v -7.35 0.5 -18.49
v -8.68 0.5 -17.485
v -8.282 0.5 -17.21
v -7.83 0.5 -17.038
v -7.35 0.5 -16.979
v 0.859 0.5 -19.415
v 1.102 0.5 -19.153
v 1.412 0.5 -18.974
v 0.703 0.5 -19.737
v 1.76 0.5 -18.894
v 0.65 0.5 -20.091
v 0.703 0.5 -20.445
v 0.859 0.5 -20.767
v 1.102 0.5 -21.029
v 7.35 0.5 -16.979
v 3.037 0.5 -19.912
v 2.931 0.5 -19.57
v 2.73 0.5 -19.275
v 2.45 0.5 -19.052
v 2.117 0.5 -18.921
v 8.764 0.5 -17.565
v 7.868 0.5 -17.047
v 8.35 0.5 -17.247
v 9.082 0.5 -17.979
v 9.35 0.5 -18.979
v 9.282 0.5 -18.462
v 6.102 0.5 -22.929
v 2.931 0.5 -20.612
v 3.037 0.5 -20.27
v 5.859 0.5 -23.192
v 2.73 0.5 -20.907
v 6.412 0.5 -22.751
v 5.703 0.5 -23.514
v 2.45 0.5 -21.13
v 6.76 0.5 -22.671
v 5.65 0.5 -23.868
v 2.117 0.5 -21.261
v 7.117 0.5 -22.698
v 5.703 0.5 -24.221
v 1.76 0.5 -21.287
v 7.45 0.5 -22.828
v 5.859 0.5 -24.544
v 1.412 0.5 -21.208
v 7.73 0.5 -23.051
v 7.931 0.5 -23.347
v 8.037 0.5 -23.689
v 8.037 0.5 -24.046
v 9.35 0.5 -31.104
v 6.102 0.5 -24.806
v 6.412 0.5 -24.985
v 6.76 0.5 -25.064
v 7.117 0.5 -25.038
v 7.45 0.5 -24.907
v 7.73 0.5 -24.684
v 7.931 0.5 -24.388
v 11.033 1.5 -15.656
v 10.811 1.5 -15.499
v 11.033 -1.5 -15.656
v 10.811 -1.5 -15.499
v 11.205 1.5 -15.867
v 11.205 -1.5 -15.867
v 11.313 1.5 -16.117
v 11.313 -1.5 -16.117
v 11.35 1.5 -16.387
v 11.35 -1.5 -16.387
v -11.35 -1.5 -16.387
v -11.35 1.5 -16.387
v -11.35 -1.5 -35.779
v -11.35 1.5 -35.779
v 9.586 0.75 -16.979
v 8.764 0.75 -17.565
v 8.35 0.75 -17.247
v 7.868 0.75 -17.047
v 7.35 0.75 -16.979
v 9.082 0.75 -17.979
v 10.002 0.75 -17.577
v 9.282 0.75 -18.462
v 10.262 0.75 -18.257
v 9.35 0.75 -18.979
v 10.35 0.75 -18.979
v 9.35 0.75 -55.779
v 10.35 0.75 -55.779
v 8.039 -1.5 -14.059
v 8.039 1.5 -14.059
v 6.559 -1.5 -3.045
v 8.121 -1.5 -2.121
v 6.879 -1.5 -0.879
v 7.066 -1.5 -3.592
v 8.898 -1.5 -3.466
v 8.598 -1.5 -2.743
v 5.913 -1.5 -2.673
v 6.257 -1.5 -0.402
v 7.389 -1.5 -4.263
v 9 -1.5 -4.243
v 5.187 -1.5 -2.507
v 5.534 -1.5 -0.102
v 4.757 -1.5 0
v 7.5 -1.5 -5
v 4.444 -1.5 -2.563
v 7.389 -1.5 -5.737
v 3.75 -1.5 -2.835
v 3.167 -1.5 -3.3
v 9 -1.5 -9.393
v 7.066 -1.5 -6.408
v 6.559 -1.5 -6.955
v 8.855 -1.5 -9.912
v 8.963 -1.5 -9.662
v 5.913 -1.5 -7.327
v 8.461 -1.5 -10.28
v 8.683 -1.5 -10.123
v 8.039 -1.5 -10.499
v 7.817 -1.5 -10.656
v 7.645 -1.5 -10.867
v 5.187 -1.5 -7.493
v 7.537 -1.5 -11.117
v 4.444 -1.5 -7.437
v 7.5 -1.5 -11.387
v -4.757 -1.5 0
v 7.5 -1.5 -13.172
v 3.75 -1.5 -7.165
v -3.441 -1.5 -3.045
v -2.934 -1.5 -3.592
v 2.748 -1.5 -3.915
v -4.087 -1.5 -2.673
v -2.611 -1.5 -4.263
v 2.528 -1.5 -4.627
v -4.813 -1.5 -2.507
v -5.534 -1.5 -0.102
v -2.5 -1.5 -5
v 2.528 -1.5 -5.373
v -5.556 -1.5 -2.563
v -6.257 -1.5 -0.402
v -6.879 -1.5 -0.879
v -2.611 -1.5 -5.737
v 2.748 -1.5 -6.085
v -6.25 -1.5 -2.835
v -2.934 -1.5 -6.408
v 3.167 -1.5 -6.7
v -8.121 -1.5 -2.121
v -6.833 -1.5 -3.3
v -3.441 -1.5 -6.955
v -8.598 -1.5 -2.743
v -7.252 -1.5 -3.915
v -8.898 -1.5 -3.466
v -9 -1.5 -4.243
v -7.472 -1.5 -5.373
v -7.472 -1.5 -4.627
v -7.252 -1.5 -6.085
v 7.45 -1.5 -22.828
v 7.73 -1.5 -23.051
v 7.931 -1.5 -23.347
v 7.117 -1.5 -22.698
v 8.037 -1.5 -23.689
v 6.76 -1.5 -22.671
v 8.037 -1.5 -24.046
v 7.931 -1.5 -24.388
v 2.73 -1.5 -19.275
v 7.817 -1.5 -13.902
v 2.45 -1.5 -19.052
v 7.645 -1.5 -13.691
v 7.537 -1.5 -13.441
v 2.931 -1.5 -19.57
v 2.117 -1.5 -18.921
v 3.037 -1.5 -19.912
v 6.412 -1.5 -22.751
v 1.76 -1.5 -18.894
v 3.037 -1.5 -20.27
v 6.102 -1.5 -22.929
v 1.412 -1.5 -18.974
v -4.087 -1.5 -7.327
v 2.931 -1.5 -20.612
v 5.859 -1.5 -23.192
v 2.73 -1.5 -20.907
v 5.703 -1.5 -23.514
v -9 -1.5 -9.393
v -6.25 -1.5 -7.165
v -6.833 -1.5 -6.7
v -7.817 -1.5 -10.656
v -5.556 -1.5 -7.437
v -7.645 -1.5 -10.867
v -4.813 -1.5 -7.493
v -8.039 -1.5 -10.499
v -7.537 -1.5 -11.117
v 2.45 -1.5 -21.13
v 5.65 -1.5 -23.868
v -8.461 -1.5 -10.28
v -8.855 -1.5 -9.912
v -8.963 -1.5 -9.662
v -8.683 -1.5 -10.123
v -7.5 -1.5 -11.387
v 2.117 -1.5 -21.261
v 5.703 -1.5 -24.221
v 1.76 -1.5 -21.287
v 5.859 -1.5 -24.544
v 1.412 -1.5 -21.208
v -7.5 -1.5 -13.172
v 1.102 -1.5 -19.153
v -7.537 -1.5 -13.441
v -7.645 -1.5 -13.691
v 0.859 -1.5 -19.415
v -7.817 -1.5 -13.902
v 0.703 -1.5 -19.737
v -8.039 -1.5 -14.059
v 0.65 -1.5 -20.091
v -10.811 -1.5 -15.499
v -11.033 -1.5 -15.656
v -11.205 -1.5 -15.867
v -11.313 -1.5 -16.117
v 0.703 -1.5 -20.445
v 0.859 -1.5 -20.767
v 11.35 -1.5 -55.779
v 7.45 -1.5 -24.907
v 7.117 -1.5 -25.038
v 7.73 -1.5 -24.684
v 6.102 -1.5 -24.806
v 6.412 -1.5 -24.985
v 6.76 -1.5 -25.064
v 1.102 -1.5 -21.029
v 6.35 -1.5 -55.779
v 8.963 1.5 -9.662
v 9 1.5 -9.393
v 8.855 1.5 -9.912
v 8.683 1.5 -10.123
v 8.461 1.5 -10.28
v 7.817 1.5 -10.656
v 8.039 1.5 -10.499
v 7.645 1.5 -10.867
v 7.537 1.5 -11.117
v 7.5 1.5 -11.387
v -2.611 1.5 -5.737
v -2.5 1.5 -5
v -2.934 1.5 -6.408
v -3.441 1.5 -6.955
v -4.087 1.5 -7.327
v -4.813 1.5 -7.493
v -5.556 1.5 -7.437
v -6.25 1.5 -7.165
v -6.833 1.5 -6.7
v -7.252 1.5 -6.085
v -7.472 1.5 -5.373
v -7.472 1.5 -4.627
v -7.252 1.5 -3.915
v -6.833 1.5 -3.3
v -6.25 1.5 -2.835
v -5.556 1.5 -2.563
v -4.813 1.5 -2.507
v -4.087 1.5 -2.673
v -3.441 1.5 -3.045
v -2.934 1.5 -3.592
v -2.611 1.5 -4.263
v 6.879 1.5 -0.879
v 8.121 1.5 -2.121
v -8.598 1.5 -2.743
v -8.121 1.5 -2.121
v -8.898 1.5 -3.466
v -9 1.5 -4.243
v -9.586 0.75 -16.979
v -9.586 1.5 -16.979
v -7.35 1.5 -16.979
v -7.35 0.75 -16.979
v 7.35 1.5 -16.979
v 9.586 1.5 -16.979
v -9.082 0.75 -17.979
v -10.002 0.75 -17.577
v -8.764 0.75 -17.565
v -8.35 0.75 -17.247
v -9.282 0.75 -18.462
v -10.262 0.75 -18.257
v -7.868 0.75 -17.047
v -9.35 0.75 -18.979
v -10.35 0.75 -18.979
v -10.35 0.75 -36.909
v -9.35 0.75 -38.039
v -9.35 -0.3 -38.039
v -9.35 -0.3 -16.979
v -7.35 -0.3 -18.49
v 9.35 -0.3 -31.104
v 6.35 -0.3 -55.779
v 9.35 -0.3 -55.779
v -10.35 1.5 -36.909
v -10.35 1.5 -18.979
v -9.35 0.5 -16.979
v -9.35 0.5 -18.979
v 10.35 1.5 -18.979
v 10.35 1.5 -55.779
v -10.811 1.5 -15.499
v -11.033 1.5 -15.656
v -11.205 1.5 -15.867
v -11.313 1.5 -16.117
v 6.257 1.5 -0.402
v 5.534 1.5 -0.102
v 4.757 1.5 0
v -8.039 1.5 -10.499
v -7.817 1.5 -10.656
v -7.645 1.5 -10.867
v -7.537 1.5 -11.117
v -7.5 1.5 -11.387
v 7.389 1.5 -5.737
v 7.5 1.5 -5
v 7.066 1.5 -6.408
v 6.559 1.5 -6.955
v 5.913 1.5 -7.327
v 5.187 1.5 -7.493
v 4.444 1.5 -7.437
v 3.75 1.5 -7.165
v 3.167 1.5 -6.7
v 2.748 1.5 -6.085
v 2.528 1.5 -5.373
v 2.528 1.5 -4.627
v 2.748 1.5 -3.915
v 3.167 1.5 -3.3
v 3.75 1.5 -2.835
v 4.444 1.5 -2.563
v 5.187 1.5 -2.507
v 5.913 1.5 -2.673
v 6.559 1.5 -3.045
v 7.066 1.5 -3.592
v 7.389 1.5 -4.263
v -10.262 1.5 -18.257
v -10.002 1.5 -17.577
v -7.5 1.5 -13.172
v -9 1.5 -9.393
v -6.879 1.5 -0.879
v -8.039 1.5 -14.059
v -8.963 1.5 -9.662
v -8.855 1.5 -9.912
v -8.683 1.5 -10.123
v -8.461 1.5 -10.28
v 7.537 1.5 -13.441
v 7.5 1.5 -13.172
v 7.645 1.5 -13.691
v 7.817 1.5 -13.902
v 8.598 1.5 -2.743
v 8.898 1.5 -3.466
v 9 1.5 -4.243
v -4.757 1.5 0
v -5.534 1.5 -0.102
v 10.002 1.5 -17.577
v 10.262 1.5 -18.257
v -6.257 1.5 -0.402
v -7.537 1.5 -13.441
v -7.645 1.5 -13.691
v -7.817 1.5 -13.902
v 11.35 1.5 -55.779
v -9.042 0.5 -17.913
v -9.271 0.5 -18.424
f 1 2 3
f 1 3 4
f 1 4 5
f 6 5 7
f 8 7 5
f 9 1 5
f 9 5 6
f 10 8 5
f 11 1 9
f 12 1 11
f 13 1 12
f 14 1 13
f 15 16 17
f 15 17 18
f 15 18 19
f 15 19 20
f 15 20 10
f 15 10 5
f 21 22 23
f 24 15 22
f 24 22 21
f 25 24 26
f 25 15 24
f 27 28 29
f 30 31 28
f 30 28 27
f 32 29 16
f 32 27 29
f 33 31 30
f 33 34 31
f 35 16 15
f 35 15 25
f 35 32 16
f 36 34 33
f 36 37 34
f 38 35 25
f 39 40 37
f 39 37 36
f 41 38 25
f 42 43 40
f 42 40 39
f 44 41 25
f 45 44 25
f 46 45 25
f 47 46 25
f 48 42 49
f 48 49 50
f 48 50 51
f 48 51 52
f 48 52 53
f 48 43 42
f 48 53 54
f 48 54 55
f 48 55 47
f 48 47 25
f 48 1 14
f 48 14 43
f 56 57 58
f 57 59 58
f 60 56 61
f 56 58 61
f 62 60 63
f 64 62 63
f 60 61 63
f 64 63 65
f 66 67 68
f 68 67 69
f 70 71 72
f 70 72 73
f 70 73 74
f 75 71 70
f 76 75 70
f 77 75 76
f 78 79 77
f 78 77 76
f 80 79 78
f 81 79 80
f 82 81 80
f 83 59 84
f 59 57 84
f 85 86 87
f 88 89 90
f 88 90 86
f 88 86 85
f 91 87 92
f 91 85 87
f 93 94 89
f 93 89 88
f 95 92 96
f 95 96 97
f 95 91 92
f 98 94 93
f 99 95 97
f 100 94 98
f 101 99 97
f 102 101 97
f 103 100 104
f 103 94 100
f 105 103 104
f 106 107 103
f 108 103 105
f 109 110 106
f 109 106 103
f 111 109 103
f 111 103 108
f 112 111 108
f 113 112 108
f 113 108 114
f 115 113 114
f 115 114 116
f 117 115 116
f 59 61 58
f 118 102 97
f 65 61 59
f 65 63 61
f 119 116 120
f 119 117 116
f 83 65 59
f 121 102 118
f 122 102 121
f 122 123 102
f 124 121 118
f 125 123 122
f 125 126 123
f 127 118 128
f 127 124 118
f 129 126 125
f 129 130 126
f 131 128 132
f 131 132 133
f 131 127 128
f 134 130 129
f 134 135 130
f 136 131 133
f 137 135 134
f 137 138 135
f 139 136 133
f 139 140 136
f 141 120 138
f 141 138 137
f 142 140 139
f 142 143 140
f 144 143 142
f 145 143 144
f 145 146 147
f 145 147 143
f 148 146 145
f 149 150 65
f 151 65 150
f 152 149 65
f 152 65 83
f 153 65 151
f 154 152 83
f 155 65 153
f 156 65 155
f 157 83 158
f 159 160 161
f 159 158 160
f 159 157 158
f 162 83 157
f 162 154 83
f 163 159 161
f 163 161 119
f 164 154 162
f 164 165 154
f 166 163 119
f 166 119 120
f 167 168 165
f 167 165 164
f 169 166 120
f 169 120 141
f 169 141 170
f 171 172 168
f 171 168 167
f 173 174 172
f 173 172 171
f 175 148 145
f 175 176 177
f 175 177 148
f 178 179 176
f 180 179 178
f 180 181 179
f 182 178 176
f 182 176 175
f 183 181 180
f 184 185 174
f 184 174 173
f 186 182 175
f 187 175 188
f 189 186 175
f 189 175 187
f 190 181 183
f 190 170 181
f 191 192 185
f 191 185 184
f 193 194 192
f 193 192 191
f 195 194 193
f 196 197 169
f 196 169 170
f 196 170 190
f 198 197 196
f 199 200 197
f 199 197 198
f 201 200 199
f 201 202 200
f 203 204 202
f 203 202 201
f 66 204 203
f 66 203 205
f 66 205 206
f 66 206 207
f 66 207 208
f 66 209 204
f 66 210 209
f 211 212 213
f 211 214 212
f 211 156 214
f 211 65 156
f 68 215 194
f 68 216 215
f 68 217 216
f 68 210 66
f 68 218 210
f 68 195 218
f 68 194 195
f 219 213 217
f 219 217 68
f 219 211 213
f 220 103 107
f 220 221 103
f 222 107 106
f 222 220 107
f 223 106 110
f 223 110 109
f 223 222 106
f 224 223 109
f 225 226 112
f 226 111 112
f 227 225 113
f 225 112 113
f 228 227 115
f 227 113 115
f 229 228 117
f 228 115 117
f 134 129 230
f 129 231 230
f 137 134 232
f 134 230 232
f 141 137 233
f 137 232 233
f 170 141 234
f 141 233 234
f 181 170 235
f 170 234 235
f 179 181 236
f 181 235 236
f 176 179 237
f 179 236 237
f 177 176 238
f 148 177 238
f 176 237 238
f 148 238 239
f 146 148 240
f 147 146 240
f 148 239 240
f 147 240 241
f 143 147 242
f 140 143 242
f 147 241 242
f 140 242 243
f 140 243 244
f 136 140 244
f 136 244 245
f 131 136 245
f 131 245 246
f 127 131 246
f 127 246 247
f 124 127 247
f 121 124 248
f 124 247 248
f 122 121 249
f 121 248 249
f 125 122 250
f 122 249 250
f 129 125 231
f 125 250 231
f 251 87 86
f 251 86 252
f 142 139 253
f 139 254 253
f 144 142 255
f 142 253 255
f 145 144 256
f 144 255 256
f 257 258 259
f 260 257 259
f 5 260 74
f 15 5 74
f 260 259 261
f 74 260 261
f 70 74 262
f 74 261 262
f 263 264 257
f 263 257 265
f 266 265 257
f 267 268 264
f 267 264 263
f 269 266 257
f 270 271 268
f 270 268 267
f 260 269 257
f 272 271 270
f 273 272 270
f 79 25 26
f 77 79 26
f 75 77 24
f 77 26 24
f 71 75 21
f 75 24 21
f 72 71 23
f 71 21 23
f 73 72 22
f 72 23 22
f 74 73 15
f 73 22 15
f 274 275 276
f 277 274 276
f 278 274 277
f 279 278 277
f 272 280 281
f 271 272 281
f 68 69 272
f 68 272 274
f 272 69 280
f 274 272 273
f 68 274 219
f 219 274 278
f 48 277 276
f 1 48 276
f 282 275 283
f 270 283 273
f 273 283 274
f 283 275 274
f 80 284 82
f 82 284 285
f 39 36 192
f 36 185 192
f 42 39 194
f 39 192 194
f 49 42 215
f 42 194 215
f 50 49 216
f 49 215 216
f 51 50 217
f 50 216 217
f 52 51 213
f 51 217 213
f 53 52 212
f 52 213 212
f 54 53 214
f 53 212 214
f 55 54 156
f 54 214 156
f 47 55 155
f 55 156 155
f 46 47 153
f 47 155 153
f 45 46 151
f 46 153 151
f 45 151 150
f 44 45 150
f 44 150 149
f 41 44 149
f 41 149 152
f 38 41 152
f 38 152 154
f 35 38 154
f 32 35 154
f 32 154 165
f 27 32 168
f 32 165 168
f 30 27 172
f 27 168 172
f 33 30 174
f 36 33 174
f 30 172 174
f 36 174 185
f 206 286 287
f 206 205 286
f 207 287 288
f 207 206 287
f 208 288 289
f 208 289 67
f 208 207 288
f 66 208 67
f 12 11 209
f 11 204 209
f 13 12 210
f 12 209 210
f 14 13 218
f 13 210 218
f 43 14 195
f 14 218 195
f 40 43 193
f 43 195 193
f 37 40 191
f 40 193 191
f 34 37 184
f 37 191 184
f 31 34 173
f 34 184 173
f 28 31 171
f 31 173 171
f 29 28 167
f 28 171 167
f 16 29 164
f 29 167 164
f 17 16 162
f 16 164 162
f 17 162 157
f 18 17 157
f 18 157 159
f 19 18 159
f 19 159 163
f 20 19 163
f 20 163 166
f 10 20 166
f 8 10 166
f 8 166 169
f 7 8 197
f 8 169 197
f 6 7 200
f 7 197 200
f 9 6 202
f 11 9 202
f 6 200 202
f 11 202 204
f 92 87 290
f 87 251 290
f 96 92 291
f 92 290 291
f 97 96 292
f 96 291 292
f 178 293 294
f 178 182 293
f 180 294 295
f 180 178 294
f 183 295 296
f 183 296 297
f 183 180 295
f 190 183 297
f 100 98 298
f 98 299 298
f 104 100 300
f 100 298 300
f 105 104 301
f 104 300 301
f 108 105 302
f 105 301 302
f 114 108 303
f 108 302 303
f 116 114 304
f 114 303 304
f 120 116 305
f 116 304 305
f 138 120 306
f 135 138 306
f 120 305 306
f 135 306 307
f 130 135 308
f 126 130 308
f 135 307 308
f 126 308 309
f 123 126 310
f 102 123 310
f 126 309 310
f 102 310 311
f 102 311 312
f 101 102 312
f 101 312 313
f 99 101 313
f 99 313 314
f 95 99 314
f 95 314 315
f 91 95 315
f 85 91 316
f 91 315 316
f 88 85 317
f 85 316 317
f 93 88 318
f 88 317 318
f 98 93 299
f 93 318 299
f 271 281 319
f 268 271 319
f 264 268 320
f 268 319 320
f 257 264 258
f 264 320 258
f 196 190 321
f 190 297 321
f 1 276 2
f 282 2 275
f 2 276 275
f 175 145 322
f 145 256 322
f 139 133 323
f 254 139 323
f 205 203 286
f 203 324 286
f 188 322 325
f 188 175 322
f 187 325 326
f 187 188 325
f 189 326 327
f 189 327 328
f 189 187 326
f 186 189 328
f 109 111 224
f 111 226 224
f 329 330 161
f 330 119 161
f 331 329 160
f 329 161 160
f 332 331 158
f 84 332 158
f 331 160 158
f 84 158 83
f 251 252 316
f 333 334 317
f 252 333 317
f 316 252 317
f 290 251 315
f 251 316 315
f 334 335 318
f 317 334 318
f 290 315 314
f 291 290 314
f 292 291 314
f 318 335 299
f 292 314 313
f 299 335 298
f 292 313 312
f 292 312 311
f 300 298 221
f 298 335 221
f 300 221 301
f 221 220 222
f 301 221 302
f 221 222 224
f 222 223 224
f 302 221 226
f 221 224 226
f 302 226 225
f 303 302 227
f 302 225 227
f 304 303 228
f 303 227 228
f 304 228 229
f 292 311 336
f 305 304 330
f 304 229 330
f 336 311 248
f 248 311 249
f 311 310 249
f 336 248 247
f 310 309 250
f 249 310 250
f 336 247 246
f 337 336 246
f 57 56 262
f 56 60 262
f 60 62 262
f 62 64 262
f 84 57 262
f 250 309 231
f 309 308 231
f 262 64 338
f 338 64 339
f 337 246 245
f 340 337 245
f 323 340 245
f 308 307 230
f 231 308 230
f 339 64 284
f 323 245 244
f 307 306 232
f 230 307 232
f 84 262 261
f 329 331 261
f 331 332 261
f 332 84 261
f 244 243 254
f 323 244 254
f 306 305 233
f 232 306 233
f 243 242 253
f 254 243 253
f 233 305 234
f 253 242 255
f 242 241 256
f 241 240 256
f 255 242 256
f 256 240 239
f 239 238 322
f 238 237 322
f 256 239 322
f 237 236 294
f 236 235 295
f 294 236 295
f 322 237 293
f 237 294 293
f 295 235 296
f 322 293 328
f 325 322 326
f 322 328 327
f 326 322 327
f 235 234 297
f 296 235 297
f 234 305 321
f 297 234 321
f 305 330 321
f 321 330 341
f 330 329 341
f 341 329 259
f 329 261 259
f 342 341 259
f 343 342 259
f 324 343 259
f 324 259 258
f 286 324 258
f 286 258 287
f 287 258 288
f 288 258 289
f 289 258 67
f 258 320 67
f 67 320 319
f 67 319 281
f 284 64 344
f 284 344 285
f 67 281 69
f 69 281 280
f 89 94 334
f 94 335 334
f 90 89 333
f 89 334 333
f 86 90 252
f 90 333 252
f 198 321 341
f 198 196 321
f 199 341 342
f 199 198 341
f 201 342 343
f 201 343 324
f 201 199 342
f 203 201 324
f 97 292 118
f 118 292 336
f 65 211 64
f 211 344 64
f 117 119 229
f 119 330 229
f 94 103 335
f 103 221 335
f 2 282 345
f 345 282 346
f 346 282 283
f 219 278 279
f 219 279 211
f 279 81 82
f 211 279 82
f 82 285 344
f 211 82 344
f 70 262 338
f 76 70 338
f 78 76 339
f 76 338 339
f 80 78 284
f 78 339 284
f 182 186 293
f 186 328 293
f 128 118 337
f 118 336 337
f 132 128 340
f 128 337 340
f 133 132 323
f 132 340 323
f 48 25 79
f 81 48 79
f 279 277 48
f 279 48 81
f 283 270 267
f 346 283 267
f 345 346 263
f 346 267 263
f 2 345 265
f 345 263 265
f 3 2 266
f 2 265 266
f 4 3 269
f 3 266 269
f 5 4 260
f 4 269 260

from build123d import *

# Parameters (mm, degrees)
BOSS_EXTRUDE1_DEPTH                             = 1.5
SKETCH2_R                                       = 2.5
CUT_EXTRUDE1_DEPTH                              = 2.5
CUT_EXTRUDE1_DEPTH_BACK                         = 2.5
SKETCH4_W                                       = 18.7
SKETCH4_H                                       = 38.8
CUT_EXTRUDE4_DEPTH                              = 2.5
SKETCH4_2_W                                     = 18.7
SKETCH4_2_H                                     = 38.8
CUT_EXTRUDE5_DEPTH                              = 0.3
FILLET6_R                                       = 2
SKETCH4_4_W                                     = 18.7
SKETCH4_4_H                                     = 38.8
CUT_EXTRUDE6_DEPTH                              = 0.5
CUT_EXTRUDE6_DEPTH_BACK                         = 0.3
BOSS_EXTRUDE2_DEPTH                             = 0.8
FILLET7_R                                       = 2
CHAMFER1_SIZE                                   = 3
FILLET2_R                                       = 1
FILLET3_R                                       = 3
CUT_EXTRUDE7_DEPTH                              = 0.75
CSK_FOR_M2_FLAT_HEAD_MACHINE_SCREW1_D           = 2.4
CSK_FOR_M2_FLAT_HEAD_MACHINE_SCREW1_DEPTH       = 4
CSK_FOR_M2_FLAT_HEAD_MACHINE_SCREW1_CSINK_D     = 4.4
CSK_FOR_M2_FLAT_HEAD_MACHINE_SCREW1_CSINK_ANGLE = 90
CSK_FOR_M2_FLAT_HEAD_MACHINE_SCREW1_TIP         = 0.721032743


with BuildPart() as part:
    # Sketch1 → Boss-Extrude1 (new body, symmetric)
    with BuildSketch(Plane(origin=(0, 0, 0), x_dir=(1, 0, 0), z_dir=(0, 1, 0))):
        Polygon((-9, 0), (-9, 10), (-7.5, 10.779220779), (-7.5, 13.779220779), (-11.35, 15.779220779), (-11.35, 35.779220779), (6.35, 55.779220779), (11.35, 55.779220779), (11.35, 15.779220779), (7.5, 13.779220779), (7.5, 10.779220779), (9, 10), (9, 0), align=None)
    extrude(amount=BOSS_EXTRUDE1_DEPTH, both=True)

    # Sketch2 → Cut-Extrude1 (cut, two sides)
    with BuildSketch(Plane(origin=(0, 0, 0), x_dir=(1, 0, 0), z_dir=(0, 1, 0))) as cut_extrude1_sk:
        with Locations((-5, 5)):
            Circle(SKETCH2_R)
        with Locations((5, 5)):
            Circle(SKETCH2_R)
    extrude(amount=CUT_EXTRUDE1_DEPTH, mode=Mode.SUBTRACT)
    extrude(cut_extrude1_sk.sketch, amount=-CUT_EXTRUDE1_DEPTH_BACK, mode=Mode.SUBTRACT)

    # Sketch4 → Cut-Extrude4 (cut, through all)
    with BuildSketch(Plane(origin=(0, 0, 0), x_dir=(1, 0, 0), z_dir=(0, 1, 0))):
        with Locations((0, 36.379220779)):
            Rectangle(SKETCH4_W, SKETCH4_H)
    extrude(amount=CUT_EXTRUDE4_DEPTH, mode=Mode.SUBTRACT)

    # Sketch4<2> → Cut-Extrude5 (cut, symmetric)
    with BuildSketch(Plane(origin=(0, 0, 0), x_dir=(1, 0, 0), z_dir=(0, 1, 0))):
        with Locations((0, 36.379220779)):
            Rectangle(SKETCH4_2_W, SKETCH4_2_H)
    extrude(amount=CUT_EXTRUDE5_DEPTH, both=True, mode=Mode.SUBTRACT)

    # Fillet6
    fillet6_edges = [part.edges().sort_by_distance(p)[0] for p in [
        (-9.35, 0.6, -16.979220779),
    ]]
    fillet(fillet6_edges, radius=FILLET6_R)

    # Sketch4<4> → Cut-Extrude6 (cut, two sides)
    with BuildSketch(Plane(origin=(0, 0, 0), x_dir=(1, 0, 0), z_dir=(0, 1, 0))) as cut_extrude6_sk:
        with Locations((0, 36.379220779)):
            Rectangle(SKETCH4_4_W, SKETCH4_4_H)
    extrude(amount=CUT_EXTRUDE6_DEPTH, mode=Mode.SUBTRACT)
    extrude(cut_extrude6_sk.sketch, amount=-CUT_EXTRUDE6_DEPTH_BACK, mode=Mode.SUBTRACT)

    # Sketch9 → Boss-Extrude2 (add)
    with BuildSketch(Plane(origin=(0, -0.3, 0), x_dir=(1, 0, 0), z_dir=(0, 1, 0))):
        Polygon((9.35, 16.979220779), (9.35, 31.104220779), (-7.35, 18.489915966), (-9.35, 16.979220779), align=None)
    extrude(amount=BOSS_EXTRUDE2_DEPTH)

    # Fillet7
    fillet7_edges = [part.edges().sort_by_distance(p)[0] for p in [
        (9.35, 1, -16.979220779),
    ]]
    fillet(fillet7_edges, radius=FILLET7_R)

    # Chamfer1
    chamfer1_edges = [part.edges().sort_by_distance(p)[0] for p in [
        (-9, 0, 0),
        (9, 0, 0),
    ]]
    chamfer(chamfer1_edges, length=CHAMFER1_SIZE)

    # Fillet2
    fillet2_edges = [part.edges().sort_by_distance(p)[0] for p in [
        (-9, 0, -10),
        (-7.5, 0, -10.779220779),
        (-7.5, 0, -13.779220779),
        (-11.35, 0, -15.779220779),
        (11.35, 0, -15.779220779),
        (7.5, 0, -13.779220779),
        (7.5, 0, -10.779220779),
        (9, 0, -10),
    ]]
    fillet(fillet2_edges, radius=FILLET2_R)

    # Fillet3
    fillet3_edges = [part.edges().sort_by_distance(p)[0] for p in [
        (9, 0, -3),
        (-6, 0, 0),
        (6, 0, 0),
        (-9, 0, -3),
    ]]
    fillet(fillet3_edges, radius=FILLET3_R)

    # Sketch10 → Cut-Extrude7 (cut)
    with BuildSketch(Plane(origin=(0, 1.5, 0), x_dir=(1, 0, 0), z_dir=(0, 1, 0))):
        with BuildLine():
            Line((-10.35, 36.909164283), (-10.35, 18.97922078))
            ThreePointArc((-10.35, 18.97922078), (-10.152517077, 17.908754511), (-9.586067977, 16.97922078))
            Line((-9.586067977, 16.97922078), (9.586067977, 16.97922078))
            ThreePointArc((9.586067977, 16.97922078), (10.152517077, 17.908754511), (10.35, 18.97922078))
            Line((10.35, 18.97922078), (10.35, 55.77922078))
            Line((10.35, 55.77922078), (6.35, 55.77922078))
            Line((6.35, 55.77922078), (-10.35, 36.909164283))
        make_face()
    extrude(amount=-CUT_EXTRUDE7_DEPTH, mode=Mode.SUBTRACT)

    # CSK for M2 Flat Head Machine Screw1
    with Locations(Plane(origin=(-5, 1.5, 32.5), x_dir=(1, 0, 0), z_dir=(0, 1, 0))):
        with Locations((11.85, 56.367589763), (6.85, 52.590851795)):
            CounterSinkHole(CSK_FOR_M2_FLAT_HEAD_MACHINE_SCREW1_D / 2, CSK_FOR_M2_FLAT_HEAD_MACHINE_SCREW1_CSINK_D / 2, depth=CSK_FOR_M2_FLAT_HEAD_MACHINE_SCREW1_DEPTH, counter_sink_angle=CSK_FOR_M2_FLAT_HEAD_MACHINE_SCREW1_CSINK_ANGLE)
            with Locations((0, 0, -(CSK_FOR_M2_FLAT_HEAD_MACHINE_SCREW1_DEPTH + CSK_FOR_M2_FLAT_HEAD_MACHINE_SCREW1_TIP / 2))):  # 118° drill point
                Cone(0, CSK_FOR_M2_FLAT_HEAD_MACHINE_SCREW1_D / 2, CSK_FOR_M2_FLAT_HEAD_MACHINE_SCREW1_TIP, mode=Mode.SUBTRACT)


solid = part.part
